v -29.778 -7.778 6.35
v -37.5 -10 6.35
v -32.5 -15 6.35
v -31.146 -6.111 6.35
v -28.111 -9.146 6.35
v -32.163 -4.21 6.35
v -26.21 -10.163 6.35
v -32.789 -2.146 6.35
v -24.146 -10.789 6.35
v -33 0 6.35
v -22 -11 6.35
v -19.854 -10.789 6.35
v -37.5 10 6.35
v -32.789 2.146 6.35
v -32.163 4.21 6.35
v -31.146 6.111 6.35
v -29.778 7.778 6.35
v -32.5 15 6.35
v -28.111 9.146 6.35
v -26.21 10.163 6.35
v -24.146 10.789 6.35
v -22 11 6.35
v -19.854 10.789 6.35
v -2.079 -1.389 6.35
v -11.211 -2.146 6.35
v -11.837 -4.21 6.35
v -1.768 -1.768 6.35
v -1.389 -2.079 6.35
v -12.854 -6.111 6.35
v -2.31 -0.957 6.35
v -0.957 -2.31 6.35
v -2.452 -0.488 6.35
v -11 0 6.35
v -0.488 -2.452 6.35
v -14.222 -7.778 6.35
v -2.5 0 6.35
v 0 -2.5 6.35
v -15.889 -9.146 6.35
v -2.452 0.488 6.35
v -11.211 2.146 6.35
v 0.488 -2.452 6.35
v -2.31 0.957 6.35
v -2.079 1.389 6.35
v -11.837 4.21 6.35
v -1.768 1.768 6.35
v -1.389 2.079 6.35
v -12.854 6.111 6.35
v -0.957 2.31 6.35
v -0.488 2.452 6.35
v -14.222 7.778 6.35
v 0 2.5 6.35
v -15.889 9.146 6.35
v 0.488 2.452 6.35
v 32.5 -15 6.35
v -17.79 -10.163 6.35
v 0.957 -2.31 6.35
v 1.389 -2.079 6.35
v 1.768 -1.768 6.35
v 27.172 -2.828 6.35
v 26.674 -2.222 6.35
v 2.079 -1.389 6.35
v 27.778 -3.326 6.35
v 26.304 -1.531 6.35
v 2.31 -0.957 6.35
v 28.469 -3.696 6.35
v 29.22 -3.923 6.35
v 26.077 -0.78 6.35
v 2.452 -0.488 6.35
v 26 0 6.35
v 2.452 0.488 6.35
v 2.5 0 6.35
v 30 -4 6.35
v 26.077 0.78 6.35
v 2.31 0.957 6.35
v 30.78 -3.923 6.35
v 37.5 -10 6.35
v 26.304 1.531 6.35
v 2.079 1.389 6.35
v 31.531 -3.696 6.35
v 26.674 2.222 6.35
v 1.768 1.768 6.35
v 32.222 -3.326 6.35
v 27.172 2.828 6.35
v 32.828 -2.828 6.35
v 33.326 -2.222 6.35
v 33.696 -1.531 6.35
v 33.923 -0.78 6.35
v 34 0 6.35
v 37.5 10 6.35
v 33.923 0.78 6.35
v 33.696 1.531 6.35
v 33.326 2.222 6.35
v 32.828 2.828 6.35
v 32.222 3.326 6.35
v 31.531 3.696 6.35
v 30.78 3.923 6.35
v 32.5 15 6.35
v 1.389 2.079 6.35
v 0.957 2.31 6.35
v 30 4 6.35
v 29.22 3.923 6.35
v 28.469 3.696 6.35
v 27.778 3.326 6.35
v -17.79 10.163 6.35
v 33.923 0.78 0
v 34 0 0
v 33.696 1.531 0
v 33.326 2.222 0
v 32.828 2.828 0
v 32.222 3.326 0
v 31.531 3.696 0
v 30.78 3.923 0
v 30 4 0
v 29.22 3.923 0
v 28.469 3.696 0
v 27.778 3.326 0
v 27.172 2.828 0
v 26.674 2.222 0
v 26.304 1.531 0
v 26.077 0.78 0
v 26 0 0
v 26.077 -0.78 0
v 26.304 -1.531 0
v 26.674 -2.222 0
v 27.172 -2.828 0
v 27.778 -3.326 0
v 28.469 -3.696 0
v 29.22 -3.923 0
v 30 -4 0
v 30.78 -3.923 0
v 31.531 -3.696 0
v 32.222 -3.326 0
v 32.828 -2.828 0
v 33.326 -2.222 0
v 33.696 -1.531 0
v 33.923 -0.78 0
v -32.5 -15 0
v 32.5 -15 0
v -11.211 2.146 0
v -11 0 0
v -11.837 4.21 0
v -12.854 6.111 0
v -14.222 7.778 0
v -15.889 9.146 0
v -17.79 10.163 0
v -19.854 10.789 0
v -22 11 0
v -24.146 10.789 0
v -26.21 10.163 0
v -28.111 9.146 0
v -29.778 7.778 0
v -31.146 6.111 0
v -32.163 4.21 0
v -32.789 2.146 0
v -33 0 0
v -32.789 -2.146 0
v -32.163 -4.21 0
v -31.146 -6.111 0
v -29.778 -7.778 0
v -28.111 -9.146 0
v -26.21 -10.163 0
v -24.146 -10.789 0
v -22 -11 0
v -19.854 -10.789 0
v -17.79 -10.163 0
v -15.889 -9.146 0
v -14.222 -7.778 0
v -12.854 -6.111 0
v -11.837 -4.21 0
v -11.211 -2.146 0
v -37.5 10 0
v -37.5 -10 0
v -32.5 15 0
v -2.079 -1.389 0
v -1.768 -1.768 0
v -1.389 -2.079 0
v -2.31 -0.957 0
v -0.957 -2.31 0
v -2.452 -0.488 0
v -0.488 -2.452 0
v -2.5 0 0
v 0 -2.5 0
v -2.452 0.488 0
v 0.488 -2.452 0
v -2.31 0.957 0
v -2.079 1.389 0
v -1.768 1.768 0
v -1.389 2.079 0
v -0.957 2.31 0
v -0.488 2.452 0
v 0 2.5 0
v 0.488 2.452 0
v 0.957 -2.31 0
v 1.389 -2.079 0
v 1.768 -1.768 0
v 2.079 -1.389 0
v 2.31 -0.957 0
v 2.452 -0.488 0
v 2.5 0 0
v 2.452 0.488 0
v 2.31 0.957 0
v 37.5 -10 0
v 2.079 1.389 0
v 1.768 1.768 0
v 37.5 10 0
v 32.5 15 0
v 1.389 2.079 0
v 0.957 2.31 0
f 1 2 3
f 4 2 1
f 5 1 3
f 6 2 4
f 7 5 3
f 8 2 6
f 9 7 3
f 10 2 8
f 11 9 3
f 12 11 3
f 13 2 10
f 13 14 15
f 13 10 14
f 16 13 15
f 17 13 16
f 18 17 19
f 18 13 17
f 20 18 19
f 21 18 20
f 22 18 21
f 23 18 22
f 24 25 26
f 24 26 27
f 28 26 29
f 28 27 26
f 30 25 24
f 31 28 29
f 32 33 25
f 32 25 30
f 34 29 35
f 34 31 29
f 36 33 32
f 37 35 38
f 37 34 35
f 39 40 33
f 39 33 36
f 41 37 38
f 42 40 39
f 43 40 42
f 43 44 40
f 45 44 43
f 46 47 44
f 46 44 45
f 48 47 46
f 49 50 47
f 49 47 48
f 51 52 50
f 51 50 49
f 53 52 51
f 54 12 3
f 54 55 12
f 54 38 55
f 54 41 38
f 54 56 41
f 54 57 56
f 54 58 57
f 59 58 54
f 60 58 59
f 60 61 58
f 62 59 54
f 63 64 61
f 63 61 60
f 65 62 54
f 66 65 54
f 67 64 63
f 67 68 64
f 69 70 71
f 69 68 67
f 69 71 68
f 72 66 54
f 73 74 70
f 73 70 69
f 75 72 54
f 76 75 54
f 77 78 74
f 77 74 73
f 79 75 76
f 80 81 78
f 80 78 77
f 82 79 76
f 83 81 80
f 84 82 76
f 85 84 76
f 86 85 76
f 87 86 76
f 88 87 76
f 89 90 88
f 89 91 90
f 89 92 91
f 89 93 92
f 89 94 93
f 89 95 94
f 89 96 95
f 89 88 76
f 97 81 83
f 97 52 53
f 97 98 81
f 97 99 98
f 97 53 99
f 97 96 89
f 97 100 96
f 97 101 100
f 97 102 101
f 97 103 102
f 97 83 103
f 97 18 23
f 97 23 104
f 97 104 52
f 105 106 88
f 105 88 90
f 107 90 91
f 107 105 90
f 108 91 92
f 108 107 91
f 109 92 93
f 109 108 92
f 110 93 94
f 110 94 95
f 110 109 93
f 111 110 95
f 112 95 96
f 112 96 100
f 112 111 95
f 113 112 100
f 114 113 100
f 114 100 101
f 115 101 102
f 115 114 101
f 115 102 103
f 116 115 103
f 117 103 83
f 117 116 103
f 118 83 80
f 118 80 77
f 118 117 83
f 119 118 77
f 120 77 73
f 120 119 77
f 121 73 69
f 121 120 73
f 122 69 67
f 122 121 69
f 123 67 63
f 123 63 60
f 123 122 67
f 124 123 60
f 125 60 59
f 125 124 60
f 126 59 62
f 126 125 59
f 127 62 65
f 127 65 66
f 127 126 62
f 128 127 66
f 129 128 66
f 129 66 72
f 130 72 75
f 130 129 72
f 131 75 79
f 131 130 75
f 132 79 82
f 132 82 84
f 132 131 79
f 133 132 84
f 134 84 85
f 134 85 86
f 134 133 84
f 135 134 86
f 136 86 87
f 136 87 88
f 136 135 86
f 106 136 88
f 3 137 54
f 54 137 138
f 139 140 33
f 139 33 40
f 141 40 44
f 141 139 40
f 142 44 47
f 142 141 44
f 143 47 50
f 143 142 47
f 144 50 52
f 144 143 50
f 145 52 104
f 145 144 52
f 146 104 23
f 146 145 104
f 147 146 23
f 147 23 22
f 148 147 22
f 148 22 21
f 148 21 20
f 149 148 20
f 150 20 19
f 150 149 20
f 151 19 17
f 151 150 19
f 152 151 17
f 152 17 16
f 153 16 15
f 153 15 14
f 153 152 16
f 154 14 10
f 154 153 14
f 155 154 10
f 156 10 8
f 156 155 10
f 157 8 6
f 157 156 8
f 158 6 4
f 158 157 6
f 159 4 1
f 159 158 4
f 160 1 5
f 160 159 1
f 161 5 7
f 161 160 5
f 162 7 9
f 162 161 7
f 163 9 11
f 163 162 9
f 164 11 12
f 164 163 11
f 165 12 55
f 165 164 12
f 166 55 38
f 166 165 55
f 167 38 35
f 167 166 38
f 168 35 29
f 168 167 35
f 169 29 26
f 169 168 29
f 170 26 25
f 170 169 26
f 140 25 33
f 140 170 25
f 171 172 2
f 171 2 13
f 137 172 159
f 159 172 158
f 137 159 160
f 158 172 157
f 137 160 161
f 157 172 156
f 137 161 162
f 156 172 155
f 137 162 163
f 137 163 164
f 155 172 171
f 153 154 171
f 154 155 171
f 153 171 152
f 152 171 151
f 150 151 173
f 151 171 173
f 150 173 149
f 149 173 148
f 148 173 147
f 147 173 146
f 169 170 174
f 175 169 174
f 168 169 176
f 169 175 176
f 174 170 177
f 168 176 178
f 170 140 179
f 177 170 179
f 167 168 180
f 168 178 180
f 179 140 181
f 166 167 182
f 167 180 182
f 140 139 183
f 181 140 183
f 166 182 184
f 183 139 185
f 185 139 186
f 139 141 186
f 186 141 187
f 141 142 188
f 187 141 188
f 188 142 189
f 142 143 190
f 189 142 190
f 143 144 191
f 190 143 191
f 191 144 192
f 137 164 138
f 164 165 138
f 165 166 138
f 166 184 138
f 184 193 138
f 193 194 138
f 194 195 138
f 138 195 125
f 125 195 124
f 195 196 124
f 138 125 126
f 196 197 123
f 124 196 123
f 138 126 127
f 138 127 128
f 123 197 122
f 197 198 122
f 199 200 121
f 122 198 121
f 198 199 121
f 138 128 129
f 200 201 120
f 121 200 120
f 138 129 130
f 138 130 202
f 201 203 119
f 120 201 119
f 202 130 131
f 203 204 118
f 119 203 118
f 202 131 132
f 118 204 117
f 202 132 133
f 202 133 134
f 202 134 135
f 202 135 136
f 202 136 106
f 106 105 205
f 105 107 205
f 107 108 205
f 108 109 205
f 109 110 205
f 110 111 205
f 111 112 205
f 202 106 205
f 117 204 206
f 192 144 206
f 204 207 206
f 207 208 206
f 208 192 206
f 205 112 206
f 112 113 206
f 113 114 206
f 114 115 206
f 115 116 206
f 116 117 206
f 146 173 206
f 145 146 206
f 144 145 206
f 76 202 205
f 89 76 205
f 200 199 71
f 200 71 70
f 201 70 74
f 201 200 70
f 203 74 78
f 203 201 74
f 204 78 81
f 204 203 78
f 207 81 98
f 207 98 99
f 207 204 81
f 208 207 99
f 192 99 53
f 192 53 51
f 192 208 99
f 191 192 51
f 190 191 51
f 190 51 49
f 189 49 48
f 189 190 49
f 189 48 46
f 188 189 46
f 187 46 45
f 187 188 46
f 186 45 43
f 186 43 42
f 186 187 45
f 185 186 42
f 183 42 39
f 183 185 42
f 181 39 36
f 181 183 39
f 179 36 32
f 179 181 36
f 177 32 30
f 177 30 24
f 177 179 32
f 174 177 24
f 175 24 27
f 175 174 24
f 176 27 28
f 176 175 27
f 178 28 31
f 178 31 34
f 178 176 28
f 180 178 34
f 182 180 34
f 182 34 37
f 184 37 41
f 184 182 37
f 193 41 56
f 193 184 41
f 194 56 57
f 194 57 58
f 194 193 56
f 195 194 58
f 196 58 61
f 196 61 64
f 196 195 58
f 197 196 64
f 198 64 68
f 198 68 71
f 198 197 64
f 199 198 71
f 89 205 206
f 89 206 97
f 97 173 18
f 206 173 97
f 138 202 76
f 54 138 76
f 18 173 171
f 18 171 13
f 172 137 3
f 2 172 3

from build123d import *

# Parameters (mm, degrees)
SKETCH1_W           = 75
SKETCH1_H           = 30
SKETCH1_R           = 11
SKETCH1_R_2         = 2.5
SKETCH1_R_3         = 4
BOSS_EXTRUDE1_DEPTH = 6.35
CHAMFER1_SIZE       = 5


with BuildPart() as part:
    # Sketch1 → Boss-Extrude1 (new body)
    with BuildSketch(Plane.XY):
        Rectangle(SKETCH1_W, SKETCH1_H)
        with Locations((-22, 0)):
            Circle(SKETCH1_R, mode=Mode.SUBTRACT)
        Circle(SKETCH1_R_2, mode=Mode.SUBTRACT)
        with Locations((30, 0)):
            Circle(SKETCH1_R_3, mode=Mode.SUBTRACT)
    extrude(amount=BOSS_EXTRUDE1_DEPTH)

    # Chamfer1
    chamfer1_edges = [part.edges().sort_by_distance(p)[0] for p in [
        (37.5, -15, 3.175),
        (-37.5, -15, 3.175),
        (-37.5, 15, 3.175),
        (37.5, 15, 3.175),
    ]]
    chamfer(chamfer1_edges, length=CHAMFER1_SIZE)


solid = part.part
